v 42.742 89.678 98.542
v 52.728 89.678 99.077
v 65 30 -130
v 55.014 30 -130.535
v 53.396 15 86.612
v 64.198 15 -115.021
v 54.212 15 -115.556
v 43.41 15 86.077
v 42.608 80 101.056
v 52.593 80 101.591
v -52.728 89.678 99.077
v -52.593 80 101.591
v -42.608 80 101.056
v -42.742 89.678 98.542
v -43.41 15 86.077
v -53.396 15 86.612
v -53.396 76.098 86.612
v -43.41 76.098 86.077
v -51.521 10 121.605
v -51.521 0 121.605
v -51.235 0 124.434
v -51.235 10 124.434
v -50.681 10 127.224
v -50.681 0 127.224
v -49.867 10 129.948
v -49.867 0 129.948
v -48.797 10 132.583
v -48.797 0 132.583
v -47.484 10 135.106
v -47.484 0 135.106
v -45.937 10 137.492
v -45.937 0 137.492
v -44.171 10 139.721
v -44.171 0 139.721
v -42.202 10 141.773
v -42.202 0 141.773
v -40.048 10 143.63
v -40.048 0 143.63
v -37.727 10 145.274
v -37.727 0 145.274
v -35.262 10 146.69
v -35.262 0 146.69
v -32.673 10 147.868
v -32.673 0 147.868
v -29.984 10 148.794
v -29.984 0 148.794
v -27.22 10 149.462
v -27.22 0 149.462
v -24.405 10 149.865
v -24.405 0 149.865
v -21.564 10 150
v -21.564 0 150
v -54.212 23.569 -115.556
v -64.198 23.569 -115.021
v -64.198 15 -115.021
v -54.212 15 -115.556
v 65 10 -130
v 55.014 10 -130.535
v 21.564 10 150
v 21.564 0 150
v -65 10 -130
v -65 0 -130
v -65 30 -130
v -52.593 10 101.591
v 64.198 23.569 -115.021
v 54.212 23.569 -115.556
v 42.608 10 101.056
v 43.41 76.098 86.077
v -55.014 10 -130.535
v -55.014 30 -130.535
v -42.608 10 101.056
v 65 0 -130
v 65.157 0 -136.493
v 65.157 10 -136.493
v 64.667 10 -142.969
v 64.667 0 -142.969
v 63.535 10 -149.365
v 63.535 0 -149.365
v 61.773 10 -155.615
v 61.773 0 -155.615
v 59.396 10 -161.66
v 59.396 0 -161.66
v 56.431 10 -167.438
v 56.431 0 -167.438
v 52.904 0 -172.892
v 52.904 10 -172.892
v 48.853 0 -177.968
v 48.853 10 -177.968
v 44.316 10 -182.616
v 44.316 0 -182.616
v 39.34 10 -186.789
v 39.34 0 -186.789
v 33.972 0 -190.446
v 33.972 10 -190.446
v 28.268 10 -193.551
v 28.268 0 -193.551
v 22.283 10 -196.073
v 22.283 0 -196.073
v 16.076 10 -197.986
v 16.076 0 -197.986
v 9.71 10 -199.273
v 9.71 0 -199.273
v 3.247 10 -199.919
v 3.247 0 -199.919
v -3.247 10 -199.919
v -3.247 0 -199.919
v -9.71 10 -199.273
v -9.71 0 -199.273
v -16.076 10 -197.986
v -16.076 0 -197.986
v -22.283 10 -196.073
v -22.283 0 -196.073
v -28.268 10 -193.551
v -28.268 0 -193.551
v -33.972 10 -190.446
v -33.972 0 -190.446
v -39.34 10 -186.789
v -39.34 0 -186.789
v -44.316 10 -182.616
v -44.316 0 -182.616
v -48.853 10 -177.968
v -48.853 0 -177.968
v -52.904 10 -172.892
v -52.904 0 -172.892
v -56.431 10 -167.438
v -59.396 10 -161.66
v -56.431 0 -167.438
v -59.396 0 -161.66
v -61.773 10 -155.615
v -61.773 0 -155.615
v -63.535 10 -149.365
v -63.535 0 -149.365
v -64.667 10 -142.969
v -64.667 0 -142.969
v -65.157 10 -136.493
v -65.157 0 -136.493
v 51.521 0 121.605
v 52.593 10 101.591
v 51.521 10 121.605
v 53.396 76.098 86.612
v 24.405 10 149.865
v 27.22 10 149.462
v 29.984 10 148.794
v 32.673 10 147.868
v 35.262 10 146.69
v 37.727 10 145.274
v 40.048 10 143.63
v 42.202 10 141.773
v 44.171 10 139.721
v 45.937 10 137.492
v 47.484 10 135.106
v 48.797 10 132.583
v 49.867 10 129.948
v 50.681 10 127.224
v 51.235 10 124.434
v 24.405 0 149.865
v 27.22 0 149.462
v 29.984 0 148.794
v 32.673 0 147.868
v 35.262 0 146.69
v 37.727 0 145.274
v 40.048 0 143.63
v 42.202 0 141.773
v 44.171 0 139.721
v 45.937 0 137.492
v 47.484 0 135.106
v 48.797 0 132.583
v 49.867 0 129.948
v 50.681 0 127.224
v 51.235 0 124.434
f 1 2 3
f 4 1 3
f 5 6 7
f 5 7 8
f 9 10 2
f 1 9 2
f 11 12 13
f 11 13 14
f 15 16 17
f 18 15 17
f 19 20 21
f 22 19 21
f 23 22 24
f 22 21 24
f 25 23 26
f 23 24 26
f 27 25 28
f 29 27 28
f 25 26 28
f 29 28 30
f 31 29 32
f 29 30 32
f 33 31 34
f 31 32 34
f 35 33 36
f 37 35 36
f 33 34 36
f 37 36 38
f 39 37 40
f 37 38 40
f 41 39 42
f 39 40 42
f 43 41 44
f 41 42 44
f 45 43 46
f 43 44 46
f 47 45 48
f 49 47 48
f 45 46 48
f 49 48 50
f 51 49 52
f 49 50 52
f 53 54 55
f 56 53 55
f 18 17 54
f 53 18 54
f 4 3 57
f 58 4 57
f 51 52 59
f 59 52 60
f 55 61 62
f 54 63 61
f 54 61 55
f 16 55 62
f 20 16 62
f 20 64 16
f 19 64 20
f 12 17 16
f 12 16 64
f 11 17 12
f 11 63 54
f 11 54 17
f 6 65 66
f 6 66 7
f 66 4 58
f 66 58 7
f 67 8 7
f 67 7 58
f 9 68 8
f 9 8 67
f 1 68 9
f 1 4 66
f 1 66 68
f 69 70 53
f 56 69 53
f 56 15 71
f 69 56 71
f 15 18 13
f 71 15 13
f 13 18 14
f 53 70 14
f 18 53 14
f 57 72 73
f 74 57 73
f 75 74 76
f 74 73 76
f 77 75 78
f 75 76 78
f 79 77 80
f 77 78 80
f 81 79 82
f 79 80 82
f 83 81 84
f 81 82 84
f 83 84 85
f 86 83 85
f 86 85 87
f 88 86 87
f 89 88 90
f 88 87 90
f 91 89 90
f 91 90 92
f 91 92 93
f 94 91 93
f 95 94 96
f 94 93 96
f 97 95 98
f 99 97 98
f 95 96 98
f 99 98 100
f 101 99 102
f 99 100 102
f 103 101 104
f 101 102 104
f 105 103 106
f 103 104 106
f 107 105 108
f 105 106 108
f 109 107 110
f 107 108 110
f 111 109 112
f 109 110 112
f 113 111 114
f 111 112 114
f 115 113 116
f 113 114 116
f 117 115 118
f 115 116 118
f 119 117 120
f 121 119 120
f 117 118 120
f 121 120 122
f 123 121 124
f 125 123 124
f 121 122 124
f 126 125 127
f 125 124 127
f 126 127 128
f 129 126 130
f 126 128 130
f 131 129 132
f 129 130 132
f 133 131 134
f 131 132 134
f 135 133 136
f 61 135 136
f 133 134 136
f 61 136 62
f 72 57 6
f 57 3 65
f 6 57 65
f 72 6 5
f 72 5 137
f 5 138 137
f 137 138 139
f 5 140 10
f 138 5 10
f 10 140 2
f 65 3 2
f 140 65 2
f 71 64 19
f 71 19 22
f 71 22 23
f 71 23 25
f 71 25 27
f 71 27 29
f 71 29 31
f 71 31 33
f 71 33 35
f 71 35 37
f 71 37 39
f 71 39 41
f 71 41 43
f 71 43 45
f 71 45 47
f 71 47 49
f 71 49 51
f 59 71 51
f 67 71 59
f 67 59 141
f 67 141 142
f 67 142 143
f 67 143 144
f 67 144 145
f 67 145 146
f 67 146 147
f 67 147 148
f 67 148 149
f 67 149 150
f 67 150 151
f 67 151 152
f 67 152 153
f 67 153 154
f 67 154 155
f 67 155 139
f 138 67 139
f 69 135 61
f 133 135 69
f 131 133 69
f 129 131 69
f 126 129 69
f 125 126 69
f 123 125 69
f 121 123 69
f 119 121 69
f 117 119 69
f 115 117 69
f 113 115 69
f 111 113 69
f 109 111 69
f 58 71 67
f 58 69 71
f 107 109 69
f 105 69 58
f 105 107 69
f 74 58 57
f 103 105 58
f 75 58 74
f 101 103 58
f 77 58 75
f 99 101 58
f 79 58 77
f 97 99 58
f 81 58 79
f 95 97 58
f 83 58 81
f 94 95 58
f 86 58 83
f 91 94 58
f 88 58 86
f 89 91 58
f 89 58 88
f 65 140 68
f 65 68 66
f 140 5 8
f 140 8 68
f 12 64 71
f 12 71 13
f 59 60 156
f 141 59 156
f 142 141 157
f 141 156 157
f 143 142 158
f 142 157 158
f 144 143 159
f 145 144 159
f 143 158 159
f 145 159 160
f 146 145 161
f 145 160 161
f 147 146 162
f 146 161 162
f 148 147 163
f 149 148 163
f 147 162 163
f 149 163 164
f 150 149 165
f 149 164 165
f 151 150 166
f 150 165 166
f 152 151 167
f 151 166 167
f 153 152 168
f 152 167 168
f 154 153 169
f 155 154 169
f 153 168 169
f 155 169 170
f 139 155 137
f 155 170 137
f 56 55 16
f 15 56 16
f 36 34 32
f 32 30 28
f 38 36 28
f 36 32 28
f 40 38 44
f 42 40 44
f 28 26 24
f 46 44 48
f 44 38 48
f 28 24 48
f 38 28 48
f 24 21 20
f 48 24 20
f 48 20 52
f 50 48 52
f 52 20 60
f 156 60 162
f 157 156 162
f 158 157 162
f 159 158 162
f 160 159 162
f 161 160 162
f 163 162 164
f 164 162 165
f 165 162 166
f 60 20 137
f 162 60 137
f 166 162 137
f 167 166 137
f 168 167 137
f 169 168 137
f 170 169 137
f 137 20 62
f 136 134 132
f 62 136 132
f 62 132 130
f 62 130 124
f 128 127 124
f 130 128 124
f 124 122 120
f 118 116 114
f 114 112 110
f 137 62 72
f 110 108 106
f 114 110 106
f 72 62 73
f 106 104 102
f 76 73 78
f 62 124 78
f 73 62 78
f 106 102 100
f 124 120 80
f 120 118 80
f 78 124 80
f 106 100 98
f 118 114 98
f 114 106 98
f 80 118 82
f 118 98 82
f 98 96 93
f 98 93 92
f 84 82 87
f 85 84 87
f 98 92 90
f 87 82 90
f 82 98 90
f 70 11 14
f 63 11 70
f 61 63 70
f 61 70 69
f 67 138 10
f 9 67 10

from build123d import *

# Parameters (mm, degrees)
EXTRUDE_1_DEPTH = 10
EXTRUDE_2_DEPTH = 10


with BuildPart() as part:
    # 草图1 → 凸台-拉伸1 (new body)
    with BuildSketch(Plane(origin=(0, 0, 0), x_dir=(1, 0, 0), z_dir=(0, 1, 0))):
        with BuildLine():
            Line((-65, 130), (-51.521169198, -121.604841641))
            ThreePointArc((-51.521169198, -121.604841641), (-42.202133258, -141.773208873), (-21.56412523, -150))
            Line((-21.56412523, -150), (21.56412523, -150))
            ThreePointArc((21.56412523, -150), (42.202133258, -141.773208873), (51.521169198, -121.604841641))
            Line((51.521169198, -121.604841641), (65, 130))
            ThreePointArc((65, 130), (0, 200), (-65, 130))
        make_face()
    extrude(amount=EXTRUDE_1_DEPTH)

    # 草图2 → 凸台-拉伸2 (add)
    with BuildSketch(Plane(origin=(57.86963434, 0, 3.100158983), x_dir=(0.053494721371611875, 0, -0.9985681322700888), z_dir=(0.9985681322700889, 0, 0.05349472137161188))):
        Polygon((-96.114027072, 89.677890258), (133.291014084, 30), (133.291014084, 10), (-98.63165297, 10), (-98.63165297, 80), align=None)
        Polygon((-83.63165297, 76.097869736), (118.291014084, 23.569299726), (118.291014084, 15), (-83.63165297, 15), align=None, mode=Mode.SUBTRACT)
    extrude_2 = extrude(amount=-EXTRUDE_2_DEPTH)

    # 镜向1: 凸台-拉伸2 across plane
    add(extrude_2.mirror(Plane(origin=(0, 0, 0), x_dir=(0, 0, 1), z_dir=(1, 0, 0))))


solid = part.part
